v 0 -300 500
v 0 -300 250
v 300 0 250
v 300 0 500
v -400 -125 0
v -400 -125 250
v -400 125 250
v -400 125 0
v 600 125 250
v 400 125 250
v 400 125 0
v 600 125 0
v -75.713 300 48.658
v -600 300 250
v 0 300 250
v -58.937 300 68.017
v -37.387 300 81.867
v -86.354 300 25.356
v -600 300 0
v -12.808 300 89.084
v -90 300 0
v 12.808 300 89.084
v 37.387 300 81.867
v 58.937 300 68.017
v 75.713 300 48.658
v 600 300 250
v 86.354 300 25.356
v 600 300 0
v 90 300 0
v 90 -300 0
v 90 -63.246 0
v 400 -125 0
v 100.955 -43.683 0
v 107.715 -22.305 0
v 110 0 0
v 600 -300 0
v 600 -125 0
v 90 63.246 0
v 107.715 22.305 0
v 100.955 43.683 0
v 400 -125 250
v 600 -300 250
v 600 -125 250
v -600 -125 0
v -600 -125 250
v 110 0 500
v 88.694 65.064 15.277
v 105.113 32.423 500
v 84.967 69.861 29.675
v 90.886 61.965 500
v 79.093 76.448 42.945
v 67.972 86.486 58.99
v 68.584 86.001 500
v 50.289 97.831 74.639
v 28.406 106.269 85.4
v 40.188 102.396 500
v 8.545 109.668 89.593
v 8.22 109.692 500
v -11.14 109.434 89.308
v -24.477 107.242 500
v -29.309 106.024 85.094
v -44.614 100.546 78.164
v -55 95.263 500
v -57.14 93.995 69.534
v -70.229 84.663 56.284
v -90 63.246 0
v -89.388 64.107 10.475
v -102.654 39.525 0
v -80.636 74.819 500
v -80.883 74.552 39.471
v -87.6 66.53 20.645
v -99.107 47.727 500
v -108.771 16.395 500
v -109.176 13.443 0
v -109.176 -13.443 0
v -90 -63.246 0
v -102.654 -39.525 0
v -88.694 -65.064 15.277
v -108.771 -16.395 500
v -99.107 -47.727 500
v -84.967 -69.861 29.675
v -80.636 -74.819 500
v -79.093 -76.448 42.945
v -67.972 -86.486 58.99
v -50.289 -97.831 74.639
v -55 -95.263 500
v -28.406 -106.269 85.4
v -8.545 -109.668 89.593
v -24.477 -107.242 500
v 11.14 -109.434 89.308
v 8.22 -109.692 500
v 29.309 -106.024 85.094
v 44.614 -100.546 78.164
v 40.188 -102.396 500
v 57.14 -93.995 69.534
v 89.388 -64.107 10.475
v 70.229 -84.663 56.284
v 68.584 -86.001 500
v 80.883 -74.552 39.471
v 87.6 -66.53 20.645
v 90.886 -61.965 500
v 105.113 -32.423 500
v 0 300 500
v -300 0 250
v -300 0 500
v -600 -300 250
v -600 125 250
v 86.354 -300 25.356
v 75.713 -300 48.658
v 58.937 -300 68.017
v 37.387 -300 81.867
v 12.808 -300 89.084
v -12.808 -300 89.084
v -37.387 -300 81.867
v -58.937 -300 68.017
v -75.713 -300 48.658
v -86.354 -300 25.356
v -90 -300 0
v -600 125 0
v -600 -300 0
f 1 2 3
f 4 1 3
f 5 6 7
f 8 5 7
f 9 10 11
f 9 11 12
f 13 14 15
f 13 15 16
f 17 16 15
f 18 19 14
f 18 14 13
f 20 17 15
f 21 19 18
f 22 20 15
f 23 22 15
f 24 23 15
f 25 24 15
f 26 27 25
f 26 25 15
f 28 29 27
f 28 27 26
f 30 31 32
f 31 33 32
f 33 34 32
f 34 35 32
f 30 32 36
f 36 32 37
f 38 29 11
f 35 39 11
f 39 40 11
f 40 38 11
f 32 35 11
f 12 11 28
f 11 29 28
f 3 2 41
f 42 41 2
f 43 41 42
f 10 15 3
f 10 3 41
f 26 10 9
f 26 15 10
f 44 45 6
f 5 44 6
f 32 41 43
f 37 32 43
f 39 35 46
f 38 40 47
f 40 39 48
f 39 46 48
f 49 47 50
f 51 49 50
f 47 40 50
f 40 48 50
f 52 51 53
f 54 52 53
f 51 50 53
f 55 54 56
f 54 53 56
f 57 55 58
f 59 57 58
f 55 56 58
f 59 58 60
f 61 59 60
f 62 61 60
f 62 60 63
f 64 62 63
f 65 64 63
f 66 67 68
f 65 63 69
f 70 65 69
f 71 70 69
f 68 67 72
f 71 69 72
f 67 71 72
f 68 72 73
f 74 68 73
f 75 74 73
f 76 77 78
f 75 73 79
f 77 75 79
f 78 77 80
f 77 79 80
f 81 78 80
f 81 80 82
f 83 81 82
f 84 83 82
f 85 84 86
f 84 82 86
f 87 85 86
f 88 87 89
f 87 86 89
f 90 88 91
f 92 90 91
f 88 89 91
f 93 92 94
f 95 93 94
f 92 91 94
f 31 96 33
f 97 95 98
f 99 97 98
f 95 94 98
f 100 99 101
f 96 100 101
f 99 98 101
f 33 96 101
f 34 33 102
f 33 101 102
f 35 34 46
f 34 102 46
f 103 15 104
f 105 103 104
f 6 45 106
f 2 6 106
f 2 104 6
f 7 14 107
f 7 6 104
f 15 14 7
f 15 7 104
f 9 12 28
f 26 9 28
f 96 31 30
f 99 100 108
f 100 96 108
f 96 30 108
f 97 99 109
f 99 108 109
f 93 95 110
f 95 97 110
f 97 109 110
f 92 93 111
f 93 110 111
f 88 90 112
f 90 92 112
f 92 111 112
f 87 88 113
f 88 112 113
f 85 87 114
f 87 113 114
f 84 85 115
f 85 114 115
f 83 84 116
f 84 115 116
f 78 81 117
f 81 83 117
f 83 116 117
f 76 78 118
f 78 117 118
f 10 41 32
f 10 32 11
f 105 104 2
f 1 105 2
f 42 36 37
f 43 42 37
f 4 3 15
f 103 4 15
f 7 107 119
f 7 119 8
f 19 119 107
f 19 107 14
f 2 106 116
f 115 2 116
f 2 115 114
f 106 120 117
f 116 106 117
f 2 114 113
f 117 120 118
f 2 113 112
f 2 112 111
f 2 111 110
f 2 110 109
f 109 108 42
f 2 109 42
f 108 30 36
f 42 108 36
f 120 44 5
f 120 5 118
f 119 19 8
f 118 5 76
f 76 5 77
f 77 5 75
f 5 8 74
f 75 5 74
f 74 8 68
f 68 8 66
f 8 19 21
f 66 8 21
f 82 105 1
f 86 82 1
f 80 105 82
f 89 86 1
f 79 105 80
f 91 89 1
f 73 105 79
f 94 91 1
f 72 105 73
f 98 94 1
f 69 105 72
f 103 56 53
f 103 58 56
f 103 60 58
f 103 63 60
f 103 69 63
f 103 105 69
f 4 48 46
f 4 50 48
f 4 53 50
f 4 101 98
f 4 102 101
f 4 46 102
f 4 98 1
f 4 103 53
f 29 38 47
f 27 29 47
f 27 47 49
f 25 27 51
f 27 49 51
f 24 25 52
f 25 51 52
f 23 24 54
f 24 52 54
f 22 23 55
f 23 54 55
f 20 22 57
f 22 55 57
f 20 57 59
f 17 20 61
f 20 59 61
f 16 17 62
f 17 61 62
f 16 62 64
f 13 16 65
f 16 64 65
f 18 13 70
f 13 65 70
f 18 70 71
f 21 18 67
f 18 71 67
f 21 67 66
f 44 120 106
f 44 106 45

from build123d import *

# Parameters (mm, degrees)
F0_W     = 1200
F0_H     = 600
F1_DEPTH = 250
F2_W     = 200
F2_H     = 250
F3_DEPTH = 250.001
F5_DEPTH = 250
F6_R     = 110
F7_DEPTH = 500.001
F9_DEPTH = 600.001


with BuildPart() as f1:
    # F0 (on Top) → F1 (new body)
    with BuildSketch(Plane.XY):
        Rectangle(F0_W, F0_H)
    extrude(amount=F1_DEPTH)

    # F2 (on face) → F3 (cut, through all)
    with BuildSketch(Plane.XY.offset(250)):
        with Locations((-500, 0)):
            Rectangle(F2_W, F2_H)
        with Locations((500, 0)):
            Rectangle(F2_W, F2_H)
    extrude(amount=-F3_DEPTH, mode=Mode.SUBTRACT)

    # F4 (on face) → F5 (join)
    with BuildSketch(Plane.XY.offset(250)):
        Polygon((-300, 0), (0, -300), (300, 0), (0, 300), align=None)
    extrude(amount=F5_DEPTH)

    # F6 (on face) → F7 (cut, through all)
    with BuildSketch(Plane.XY.offset(500)):
        Circle(F6_R)
    extrude(amount=-F7_DEPTH, mode=Mode.SUBTRACT)

    # F8 (on face) → F9 (cut, through all)
    with BuildSketch(Plane.XZ.offset(300)):
        with BuildLine():
            Line((-90, 0), (90, 0))
            ThreePointArc((90, 0), (0, 90), (-90, 0))
        make_face()
    extrude(amount=-F9_DEPTH, mode=Mode.SUBTRACT)


solid = f1.part
